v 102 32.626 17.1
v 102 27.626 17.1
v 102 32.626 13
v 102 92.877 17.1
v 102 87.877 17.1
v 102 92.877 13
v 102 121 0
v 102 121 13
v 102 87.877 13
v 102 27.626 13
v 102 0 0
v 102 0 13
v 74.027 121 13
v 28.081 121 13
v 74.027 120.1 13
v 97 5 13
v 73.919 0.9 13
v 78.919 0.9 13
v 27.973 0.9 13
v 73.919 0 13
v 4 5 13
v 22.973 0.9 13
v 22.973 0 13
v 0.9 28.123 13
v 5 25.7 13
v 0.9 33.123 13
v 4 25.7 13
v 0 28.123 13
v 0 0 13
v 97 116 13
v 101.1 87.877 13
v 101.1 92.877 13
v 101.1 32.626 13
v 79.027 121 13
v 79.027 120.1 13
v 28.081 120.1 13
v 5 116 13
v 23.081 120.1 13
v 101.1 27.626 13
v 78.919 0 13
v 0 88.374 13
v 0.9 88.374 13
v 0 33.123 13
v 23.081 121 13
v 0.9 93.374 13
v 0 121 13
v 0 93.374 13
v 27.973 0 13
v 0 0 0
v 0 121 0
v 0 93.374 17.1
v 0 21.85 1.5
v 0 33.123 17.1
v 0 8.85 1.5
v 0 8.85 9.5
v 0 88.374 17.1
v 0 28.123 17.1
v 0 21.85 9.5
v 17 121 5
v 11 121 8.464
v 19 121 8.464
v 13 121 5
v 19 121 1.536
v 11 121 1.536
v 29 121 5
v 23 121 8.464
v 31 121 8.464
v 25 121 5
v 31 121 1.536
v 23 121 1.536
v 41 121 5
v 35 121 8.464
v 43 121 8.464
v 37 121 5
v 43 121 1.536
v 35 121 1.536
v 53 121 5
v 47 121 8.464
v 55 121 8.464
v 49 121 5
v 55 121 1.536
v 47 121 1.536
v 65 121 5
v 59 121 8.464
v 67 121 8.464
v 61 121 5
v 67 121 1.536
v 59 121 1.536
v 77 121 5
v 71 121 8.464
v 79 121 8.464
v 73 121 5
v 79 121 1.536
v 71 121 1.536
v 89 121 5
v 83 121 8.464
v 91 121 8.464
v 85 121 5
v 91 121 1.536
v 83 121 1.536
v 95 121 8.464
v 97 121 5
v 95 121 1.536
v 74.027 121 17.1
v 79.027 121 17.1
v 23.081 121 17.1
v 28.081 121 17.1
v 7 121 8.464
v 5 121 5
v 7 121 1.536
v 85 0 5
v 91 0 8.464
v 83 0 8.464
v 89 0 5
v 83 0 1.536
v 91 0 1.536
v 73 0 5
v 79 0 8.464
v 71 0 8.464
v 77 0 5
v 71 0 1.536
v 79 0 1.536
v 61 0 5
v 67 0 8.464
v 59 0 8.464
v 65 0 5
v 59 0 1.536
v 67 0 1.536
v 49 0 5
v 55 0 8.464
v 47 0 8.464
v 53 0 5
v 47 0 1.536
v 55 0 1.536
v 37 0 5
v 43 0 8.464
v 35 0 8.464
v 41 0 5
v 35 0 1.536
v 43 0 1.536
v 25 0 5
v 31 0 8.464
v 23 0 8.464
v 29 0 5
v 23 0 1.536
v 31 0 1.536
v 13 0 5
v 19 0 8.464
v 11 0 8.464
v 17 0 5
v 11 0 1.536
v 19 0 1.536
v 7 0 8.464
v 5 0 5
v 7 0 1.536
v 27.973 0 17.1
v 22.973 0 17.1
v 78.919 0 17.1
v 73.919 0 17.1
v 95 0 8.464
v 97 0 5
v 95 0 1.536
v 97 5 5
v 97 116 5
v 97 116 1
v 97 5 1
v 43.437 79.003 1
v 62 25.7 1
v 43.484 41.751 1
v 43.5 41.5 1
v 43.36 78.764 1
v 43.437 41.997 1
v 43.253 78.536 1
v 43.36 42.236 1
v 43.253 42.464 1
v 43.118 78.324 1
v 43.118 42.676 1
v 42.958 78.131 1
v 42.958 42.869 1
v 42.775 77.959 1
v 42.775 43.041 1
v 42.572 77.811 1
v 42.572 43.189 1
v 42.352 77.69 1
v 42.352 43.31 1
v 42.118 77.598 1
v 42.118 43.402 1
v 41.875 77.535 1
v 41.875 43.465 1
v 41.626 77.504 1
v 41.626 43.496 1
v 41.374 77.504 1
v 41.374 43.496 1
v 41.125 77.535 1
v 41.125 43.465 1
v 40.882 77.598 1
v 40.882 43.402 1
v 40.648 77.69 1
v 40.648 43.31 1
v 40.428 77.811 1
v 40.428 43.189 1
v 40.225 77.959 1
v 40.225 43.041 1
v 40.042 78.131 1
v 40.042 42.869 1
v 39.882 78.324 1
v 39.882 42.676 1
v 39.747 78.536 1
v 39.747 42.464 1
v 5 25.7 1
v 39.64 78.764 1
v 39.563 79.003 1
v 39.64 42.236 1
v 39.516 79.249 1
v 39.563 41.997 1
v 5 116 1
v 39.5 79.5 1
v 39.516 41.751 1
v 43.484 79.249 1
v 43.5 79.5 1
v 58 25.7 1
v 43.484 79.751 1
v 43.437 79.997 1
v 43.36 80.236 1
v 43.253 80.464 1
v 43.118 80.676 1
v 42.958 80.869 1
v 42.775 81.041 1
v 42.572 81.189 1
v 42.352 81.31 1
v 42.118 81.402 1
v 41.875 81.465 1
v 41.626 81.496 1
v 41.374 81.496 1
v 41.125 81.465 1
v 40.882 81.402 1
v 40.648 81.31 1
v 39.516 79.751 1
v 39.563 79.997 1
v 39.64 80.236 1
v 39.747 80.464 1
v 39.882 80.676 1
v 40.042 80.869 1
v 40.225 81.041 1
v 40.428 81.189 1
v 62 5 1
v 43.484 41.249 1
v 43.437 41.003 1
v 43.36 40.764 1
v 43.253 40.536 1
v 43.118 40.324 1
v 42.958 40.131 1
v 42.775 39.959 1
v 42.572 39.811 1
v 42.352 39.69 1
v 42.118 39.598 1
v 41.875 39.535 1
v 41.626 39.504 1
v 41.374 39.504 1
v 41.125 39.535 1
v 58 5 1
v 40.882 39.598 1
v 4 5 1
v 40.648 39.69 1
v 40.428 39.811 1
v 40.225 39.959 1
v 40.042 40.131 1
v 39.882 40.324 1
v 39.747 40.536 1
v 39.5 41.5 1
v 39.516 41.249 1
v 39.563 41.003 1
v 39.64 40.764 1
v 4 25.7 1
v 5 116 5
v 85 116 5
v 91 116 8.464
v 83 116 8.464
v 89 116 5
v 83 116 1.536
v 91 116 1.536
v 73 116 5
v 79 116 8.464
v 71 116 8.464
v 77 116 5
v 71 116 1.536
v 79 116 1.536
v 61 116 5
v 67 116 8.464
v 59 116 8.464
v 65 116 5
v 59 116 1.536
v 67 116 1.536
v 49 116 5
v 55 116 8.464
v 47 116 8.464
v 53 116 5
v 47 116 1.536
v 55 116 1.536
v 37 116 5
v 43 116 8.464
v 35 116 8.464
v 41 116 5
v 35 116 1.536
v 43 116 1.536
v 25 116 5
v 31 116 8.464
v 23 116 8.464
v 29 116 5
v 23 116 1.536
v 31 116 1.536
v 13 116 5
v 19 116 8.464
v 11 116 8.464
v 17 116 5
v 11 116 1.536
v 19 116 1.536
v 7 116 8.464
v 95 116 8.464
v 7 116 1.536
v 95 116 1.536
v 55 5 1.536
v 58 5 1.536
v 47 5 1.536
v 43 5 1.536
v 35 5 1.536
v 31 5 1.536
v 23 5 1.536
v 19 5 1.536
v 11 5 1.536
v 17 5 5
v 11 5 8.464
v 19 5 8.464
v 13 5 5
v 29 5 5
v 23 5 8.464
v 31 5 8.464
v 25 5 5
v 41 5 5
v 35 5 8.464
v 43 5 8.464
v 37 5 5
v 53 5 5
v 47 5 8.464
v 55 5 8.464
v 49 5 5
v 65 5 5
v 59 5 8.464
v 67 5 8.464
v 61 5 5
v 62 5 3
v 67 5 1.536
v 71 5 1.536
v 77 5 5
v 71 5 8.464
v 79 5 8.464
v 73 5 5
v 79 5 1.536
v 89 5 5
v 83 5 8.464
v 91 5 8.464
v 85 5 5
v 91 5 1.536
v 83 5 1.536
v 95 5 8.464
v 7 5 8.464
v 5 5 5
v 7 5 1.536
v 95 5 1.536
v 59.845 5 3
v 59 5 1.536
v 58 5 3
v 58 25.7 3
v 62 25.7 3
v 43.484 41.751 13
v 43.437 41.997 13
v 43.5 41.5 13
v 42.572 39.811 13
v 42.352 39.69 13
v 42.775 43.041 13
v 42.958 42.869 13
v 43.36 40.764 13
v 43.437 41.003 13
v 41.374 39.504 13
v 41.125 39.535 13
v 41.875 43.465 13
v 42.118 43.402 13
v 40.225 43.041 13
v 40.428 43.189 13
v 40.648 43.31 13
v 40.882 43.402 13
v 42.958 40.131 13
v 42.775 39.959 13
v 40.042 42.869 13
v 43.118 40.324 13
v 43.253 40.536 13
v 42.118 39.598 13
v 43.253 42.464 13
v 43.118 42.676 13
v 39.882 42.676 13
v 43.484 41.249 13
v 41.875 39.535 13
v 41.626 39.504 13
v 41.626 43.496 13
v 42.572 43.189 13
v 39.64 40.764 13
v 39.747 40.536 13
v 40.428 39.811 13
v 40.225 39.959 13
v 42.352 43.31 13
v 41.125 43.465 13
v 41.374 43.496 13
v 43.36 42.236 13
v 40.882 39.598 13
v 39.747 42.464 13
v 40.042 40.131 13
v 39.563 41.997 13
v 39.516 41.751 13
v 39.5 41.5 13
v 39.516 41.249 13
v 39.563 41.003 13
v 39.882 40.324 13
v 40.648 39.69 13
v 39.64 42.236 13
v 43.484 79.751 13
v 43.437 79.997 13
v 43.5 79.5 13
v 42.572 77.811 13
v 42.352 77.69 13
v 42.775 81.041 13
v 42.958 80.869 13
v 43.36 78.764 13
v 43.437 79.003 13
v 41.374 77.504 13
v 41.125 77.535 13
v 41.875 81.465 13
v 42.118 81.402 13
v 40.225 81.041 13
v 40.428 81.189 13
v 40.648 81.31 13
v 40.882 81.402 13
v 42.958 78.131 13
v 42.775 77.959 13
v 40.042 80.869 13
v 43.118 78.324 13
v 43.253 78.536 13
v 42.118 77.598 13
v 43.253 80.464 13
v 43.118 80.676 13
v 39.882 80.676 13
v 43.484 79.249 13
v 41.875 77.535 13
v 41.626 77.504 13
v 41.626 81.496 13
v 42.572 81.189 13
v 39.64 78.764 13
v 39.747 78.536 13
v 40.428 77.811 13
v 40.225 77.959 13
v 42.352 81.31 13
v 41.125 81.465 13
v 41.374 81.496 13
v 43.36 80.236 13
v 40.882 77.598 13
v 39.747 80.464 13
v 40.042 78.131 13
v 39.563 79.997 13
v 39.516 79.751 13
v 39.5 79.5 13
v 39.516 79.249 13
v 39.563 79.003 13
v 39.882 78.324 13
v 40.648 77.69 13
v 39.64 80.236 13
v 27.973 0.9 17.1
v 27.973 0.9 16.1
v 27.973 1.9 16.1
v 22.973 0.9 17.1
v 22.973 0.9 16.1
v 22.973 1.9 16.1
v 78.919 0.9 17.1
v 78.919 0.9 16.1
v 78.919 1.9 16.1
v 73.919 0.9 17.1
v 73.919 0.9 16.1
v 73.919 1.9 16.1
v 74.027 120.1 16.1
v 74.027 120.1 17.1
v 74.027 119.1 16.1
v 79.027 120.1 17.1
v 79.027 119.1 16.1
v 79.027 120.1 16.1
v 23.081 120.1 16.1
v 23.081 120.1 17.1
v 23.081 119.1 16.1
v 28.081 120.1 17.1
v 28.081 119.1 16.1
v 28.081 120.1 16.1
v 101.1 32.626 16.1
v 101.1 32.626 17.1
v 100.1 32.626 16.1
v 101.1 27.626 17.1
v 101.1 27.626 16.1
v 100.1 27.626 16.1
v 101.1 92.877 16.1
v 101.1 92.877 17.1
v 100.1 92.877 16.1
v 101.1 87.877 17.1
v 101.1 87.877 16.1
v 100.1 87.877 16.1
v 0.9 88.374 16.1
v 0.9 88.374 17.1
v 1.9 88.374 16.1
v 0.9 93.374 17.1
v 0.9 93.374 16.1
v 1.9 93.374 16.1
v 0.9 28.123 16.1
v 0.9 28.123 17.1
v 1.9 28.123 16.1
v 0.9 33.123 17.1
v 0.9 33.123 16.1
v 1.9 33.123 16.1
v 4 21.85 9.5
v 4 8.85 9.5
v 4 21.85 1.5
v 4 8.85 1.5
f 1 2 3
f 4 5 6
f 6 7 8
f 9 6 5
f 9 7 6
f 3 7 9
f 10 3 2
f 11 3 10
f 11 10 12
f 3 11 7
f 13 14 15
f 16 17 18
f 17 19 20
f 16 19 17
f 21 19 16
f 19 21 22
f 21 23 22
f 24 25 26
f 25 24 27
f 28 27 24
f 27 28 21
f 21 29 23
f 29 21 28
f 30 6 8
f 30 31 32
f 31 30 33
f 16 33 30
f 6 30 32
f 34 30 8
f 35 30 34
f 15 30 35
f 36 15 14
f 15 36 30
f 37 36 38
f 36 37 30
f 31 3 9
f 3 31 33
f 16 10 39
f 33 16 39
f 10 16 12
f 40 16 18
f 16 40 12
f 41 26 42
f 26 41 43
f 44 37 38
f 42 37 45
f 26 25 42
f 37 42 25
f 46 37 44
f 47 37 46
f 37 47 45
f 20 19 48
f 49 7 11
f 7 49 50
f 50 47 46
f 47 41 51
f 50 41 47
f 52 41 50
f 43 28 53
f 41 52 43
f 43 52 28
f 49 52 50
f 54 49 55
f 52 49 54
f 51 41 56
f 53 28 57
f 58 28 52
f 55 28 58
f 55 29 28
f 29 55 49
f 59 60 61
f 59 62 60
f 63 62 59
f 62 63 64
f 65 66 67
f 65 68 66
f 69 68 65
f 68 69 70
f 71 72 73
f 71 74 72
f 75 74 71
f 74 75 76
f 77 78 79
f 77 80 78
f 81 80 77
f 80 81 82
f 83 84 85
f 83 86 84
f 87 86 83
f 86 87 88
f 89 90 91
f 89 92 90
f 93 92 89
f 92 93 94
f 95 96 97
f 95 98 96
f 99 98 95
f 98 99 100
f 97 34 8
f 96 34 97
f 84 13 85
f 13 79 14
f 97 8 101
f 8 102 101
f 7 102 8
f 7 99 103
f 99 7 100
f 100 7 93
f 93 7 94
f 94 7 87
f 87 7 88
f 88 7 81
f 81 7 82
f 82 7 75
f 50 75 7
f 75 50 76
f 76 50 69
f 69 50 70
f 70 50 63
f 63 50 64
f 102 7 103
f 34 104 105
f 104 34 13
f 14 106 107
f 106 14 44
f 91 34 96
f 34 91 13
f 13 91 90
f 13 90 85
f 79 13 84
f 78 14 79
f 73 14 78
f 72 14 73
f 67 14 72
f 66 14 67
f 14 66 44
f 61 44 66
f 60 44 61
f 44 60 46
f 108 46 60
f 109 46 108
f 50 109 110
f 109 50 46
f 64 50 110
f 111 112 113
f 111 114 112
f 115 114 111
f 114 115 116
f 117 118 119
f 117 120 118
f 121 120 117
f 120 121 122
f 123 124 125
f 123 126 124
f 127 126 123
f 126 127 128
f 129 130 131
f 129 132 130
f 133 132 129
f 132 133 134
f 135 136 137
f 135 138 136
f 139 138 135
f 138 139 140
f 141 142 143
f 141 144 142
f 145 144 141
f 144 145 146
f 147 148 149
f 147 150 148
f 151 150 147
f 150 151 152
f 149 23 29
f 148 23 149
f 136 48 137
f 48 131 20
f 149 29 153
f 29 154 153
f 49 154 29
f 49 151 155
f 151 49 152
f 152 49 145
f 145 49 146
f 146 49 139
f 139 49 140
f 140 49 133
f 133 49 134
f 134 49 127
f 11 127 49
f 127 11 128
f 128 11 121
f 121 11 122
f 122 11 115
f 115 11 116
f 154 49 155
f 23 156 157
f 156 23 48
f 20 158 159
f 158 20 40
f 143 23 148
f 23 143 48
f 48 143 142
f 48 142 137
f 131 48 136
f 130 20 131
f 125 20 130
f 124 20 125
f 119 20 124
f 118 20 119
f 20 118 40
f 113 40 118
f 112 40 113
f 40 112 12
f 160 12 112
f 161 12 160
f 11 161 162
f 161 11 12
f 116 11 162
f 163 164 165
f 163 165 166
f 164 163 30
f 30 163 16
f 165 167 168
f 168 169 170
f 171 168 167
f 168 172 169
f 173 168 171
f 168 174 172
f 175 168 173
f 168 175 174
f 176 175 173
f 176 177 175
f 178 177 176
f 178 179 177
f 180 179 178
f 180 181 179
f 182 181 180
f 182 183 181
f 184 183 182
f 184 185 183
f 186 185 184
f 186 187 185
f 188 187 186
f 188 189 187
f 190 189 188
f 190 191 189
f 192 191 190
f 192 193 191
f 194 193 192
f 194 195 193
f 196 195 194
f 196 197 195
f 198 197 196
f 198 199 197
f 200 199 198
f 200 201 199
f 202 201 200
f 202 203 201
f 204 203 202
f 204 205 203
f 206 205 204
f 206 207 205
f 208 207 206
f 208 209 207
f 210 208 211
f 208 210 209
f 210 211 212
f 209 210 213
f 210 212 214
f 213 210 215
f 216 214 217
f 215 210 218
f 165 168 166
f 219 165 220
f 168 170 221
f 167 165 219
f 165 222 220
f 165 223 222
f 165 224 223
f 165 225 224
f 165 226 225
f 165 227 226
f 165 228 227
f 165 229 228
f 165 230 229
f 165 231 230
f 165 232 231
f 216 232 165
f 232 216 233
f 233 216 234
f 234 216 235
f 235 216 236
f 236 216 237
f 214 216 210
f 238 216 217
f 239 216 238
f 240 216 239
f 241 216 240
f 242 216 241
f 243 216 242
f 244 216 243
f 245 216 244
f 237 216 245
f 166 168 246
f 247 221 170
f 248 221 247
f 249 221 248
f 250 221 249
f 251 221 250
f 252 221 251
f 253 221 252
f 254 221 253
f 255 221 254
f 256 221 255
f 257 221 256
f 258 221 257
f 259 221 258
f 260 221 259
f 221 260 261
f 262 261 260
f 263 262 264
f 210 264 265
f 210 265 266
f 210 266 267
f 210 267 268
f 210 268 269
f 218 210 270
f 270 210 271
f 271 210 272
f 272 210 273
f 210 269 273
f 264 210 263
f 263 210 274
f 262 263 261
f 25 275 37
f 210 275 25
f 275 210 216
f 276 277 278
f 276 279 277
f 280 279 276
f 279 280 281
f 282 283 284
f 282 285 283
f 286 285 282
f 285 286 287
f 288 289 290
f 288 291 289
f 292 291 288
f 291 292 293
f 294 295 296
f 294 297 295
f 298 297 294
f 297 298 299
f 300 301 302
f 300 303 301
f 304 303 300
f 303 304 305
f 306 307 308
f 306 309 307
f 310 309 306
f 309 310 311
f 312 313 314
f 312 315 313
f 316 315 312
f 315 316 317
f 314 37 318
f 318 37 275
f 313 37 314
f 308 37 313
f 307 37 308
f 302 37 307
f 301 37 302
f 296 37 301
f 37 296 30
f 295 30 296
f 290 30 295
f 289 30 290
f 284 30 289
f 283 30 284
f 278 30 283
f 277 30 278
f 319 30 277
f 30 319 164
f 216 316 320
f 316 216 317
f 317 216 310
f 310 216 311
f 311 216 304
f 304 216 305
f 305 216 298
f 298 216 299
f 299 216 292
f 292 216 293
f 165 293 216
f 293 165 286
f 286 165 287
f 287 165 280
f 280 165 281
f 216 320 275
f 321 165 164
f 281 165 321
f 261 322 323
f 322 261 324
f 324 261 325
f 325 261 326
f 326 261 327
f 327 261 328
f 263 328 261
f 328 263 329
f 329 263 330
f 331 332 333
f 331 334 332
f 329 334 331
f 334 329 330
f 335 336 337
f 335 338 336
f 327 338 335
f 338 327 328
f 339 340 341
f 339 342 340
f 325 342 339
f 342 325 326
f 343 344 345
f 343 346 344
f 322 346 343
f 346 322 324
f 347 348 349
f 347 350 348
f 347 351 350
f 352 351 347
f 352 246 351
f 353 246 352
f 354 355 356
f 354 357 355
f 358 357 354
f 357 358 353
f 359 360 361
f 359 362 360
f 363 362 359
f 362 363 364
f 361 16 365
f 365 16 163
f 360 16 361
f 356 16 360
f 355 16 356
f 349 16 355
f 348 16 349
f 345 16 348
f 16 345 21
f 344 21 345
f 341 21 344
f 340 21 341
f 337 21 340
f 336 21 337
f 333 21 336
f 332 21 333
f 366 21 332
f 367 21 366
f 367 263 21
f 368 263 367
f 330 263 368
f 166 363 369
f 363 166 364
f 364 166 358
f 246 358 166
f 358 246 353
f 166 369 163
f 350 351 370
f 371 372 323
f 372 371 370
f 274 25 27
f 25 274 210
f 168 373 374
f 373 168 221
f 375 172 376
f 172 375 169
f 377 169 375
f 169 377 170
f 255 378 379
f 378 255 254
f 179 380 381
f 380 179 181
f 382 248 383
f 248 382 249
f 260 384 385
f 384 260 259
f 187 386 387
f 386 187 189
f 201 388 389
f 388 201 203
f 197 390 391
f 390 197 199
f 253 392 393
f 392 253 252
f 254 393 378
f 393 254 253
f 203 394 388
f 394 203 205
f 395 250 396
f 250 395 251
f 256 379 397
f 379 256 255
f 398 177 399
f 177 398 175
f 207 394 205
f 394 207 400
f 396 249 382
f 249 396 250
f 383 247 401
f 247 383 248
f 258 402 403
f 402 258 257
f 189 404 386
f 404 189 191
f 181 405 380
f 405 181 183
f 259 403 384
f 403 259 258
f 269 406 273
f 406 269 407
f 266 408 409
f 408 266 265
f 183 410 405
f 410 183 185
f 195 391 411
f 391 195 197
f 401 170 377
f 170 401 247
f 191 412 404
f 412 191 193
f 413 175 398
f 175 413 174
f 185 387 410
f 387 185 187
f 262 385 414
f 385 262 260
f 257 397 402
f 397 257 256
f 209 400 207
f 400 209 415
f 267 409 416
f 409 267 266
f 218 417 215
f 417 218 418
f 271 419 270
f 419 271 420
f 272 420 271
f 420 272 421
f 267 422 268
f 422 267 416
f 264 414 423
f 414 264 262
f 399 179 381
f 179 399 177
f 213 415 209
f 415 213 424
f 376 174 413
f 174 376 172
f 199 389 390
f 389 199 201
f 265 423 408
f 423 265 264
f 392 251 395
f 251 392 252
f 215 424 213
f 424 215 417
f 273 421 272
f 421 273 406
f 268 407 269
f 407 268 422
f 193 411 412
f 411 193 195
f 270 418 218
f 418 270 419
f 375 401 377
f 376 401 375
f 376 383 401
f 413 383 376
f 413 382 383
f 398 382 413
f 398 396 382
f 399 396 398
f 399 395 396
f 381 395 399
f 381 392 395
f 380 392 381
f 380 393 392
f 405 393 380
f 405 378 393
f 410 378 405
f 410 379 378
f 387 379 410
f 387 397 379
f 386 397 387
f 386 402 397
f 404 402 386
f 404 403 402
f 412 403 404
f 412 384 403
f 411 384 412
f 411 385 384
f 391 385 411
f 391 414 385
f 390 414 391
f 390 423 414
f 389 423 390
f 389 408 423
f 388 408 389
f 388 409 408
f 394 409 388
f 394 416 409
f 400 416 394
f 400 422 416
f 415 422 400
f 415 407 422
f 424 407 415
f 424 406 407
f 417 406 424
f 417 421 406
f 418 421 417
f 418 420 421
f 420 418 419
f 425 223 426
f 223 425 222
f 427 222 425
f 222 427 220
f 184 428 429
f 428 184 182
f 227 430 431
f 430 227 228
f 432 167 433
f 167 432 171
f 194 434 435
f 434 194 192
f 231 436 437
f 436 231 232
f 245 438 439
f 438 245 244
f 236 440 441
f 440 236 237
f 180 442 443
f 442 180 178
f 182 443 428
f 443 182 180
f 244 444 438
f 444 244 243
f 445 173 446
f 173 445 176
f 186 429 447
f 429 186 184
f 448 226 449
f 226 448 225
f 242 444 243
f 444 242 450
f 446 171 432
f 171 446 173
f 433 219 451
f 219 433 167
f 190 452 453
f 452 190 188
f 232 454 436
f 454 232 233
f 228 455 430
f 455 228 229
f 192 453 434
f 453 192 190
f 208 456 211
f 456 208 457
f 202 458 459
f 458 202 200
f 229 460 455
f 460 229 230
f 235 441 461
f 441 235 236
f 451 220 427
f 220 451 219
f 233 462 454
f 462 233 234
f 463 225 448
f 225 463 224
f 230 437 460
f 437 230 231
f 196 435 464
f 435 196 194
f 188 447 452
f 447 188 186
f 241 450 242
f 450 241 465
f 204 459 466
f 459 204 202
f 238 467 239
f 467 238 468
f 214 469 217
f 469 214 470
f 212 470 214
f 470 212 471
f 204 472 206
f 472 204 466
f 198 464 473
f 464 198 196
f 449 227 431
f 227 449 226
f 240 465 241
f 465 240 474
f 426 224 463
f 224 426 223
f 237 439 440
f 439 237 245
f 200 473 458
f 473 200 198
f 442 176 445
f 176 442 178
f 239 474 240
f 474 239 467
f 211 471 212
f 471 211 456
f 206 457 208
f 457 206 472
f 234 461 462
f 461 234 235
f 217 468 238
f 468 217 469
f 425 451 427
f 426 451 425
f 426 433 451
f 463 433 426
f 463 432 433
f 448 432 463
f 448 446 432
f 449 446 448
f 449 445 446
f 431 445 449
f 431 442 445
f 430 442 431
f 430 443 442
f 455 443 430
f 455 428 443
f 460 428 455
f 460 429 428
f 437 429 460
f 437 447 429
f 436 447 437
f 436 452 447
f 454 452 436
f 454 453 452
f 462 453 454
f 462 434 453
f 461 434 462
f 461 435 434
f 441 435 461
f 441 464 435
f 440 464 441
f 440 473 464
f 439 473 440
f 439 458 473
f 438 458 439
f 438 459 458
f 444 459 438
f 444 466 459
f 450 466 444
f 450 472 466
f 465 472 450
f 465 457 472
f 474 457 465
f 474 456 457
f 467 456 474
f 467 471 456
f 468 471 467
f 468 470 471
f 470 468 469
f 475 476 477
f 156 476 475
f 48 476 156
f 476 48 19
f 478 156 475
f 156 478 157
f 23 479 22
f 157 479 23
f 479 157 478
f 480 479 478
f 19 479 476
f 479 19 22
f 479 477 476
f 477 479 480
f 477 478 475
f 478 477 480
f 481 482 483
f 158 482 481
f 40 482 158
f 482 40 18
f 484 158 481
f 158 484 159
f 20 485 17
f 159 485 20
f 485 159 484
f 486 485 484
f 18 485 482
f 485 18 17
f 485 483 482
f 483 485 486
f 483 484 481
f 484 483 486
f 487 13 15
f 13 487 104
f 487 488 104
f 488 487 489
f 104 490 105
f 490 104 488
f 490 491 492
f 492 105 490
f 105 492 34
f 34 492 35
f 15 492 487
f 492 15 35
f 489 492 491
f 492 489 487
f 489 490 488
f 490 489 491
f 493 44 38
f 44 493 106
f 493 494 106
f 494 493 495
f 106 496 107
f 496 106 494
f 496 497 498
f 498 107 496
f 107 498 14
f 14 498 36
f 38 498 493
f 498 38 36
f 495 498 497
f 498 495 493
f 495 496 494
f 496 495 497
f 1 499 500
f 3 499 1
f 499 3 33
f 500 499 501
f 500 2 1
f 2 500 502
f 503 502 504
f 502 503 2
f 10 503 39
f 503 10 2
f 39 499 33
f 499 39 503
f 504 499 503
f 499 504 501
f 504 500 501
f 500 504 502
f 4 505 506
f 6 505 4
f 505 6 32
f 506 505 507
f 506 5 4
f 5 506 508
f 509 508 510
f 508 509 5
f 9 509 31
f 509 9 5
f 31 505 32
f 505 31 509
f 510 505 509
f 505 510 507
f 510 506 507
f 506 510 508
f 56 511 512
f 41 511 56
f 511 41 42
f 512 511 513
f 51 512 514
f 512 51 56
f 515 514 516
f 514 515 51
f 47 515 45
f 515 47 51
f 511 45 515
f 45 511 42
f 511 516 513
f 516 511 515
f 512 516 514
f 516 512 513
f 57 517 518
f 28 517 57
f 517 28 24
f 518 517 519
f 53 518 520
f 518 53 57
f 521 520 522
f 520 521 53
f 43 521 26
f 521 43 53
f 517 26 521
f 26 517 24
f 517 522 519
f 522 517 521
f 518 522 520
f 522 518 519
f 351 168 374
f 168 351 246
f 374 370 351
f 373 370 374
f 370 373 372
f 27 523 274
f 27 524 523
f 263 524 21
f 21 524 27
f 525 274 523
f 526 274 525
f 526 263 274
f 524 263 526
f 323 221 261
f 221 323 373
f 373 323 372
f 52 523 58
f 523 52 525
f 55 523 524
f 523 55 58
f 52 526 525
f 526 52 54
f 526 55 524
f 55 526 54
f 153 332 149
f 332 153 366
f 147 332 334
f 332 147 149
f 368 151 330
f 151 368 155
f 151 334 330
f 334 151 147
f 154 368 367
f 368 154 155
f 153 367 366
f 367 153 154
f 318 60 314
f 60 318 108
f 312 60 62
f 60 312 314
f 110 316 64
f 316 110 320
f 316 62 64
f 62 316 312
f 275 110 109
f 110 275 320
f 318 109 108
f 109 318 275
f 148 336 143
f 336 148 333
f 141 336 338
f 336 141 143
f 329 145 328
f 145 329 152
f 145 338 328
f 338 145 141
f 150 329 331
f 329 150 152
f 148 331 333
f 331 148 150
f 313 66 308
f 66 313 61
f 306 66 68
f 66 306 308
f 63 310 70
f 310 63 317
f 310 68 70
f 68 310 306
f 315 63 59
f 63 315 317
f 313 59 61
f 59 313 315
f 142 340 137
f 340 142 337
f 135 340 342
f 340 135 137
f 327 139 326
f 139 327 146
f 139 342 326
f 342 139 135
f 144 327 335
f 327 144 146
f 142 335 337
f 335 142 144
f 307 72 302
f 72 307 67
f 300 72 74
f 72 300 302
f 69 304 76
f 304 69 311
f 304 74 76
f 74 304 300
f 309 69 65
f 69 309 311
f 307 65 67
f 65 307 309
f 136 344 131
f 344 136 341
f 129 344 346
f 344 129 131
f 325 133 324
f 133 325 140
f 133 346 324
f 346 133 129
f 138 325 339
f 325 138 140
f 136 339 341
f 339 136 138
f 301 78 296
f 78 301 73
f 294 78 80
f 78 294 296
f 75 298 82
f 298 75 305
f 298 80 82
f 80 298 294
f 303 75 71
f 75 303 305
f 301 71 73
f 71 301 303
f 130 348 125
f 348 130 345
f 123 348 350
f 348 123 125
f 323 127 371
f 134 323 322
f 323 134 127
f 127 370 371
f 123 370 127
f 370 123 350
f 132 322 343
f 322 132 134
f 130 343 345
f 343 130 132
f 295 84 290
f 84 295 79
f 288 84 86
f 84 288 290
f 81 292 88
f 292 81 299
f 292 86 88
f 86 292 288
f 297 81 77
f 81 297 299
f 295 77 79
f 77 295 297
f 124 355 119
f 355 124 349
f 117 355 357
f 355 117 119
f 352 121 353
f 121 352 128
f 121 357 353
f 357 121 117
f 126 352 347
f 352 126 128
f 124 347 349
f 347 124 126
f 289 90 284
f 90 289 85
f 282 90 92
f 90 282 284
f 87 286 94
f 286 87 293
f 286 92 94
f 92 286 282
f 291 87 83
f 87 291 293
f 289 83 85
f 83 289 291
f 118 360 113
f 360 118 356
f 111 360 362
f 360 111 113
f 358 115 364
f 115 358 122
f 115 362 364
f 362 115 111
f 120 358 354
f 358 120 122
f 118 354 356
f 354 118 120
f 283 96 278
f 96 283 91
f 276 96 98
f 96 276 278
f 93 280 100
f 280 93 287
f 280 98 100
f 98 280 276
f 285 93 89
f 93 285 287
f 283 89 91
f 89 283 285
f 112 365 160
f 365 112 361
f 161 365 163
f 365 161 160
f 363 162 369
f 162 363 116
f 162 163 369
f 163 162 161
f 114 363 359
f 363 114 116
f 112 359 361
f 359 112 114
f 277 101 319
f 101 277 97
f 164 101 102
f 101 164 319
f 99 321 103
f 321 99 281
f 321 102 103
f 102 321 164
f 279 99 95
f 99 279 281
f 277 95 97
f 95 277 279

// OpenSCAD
// file: stm32.scad
STM32Size = [20.7, 54, 5];

module STM32Cube() {
    cube([STM32Size.x, STM32Size.y, STM32Size.z]);
}
module STM32() {
    cube([STM32Size.x, STM32Size.y, 2]);
    translate([5.85, 0, 2]) cube([9, 7.5, 3]);
}
// file: Plate.scad
module SwitchHoles(x, y, wallWidth, switchSize, separation, padding = 0) {
    for (i = [0:x-1]) {
        for (j = [0:y-1]) {
            translate([(5-padding/2)+(switchSize+separation)*i, (5-padding/2)+(switchSize+separation)*j, 0])
                cube([switchSize+padding, switchSize+padding, 2]);
        }
    }
}

module Plate(x, y, wallWidth, switchSize, switchSeparation) {
    width = wallWidth+(switchSize+switchSeparation)*x;
    length = wallWidth+(switchSize+switchSeparation)*y;
    difference() {
        cube([width, length, 1.5]);
        SwitchHoles(x, y, wallWidth, switchSize, switchSeparation);
    }
    translate([0,0,1.5])
    difference() {
        cube([width, length, 1.5]);
        SwitchHoles(x, y, wallWidth, switchSize, switchSeparation, 1.6);
    }
}

//Plate(5, 6, 5, 14, 5);
// file: Base.scad
include <Plate.scad>
include <stm32.scad>

module Supports(x, y, wallWidth, separation, size, height, angle, padding) {
    for (i = [0:x/2]) {
        for (j = [0:y-1]) {
            if (i && j && i % 2 == 0 && j % 2 == 0) {
                translate([wallWidth+padding+(size+separation)*i-2.5, wallWidth+padding+(size+separation)*j-2.5, 0])
                rotate([0, angle, 0])
                    cylinder(h=height, d=4, $fn=50);
            }
        }
    }
}

module Hole(wallSize, holeSize) {
    rotate([-90, 0, 0])
        cylinder(h=wallSize, d=holeSize, $fn=6);
}

module Holes(baseWidth, wallSize, width, length, holeSize) {
    holeSeparation = holeSize/2;
    holesCount = floor((width-(wallSize*2)+holeSeparation)/(holeSize+holeSeparation));
    echo(holesCount);
    holesWidth = (holesCount*holeSize)+((holesCount-1)*holeSeparation);
    holesOffset = wallSize+holeSize/2;
    for (i = [0:holesCount-1]) {
        translate([holesOffset+((holeSize+holeSeparation)*i), 0, (holeSize/2)+baseWidth])
            Hole(wallSize, holeSize);

        translate([holesOffset+((holeSize+holeSeparation)*i), length-wallSize, (holeSize/2)+baseWidth])
            Hole(wallSize, holeSize);
    }
}

module BaseWithCutout(width, length, height, separation, baseWidth, wallWidth, stm32Offset, usbOutOrientation, angle) {
    difference() {
        slopeHeight = (tan(angle)*width);
        union() {
            cube([width, length, height]);

            translate([0, 0, height]) {
                polyhedron(
                points = [[0, 0, 0], [0, length, 0], [width, length, 0], [width, 0, 0], [0, 0, slopeHeight], [0, length, slopeHeight]],
                faces = [[0, 1, 2, 3], [5, 4, 3, 2], [0, 4, 5, 1], [0, 3, 4], [5, 2, 1]]
                );
            }
        }

        translate([wallWidth, wallWidth, baseWidth])
        cube([width-(wallWidth*2), length-(wallWidth*2), height-baseWidth+slopeHeight]);

        // STM32 cutout
        if (usbOutOrientation == 2) {
            translate([0, wallWidth, baseWidth])
                cube([wallWidth, STM32Size.x, STM32Size.z + stm32Offset + 3]);
        } else {
            translate([0, wallWidth, baseWidth])
                cube([wallWidth, STM32Size.y, STM32Size.z + stm32Offset + 3]);
        }
    }
}

module STM32CaseBase(stm32Offset, wallWidth, baseWidth) {
    ceilingWidth = 3;
    cube([STM32Size.x+wallWidth, STM32Size.y+(wallWidth*2), STM32Size.z+stm32Offset+ceilingWidth+baseWidth]);
}

module STM32Case(stm32Offset, caseWallWidth, baseWidth, wallWidth, usbOutOrientation) {
    difference() {
        STM32CaseBase(stm32Offset, caseWallWidth, baseWidth);

        if (usbOutOrientation == 2) {
            translate([0, 0, baseWidth+2])
            cube([STM32Size.x+caseWallWidth, STM32Size.y+(caseWallWidth*1), STM32Size.z+stm32Offset+3+baseWidth]);
        }

        // Inside cutout
        translate([caseWallWidth, caseWallWidth, baseWidth])
            cube([STM32Size.x+wallWidth, STM32Size.y, STM32Size.z+stm32Offset]);

        // USB plug
        usbWidth = 13;
        usbHeight = 5;
        translate([caseWallWidth+STM32Size.x/2-usbWidth/2, usbOutOrientation == 1 || usbOutOrientation == 2 ? STM32Size.y+caseWallWidth : 0, baseWidth+0.5])
            cube([usbWidth, usbHeight, 8]);
    }
}

module Clip() {
    cube([5, 0.9, 4.1]);
    l=5;
    w=1;
    h=1;
    translate([0, 0.9, 3.1]) {
        polyhedron(
            points = [[0, 0, 0], [l, 0, 0], [l, w, 0], [0, w, 0], [0, 0, h], [l, 0, h]],
            faces = [[0, 1, 2, 3], [5, 4, 3, 2], [0, 4, 5, 1], [0, 3, 4], [5, 2, 1]]
        );
    }
}

module Base(x, y, heightOffset, baseWidth, wallWidth, size, separation, angle, holeSize, usbOutOrientation, withPlate = false) {
    assert(separation >= 5, "Separation of switches cannot be less than 5 otherwise keycaps won't go in");
    padding = 1;
    width = (wallWidth + (size+separation)*x) + padding*2;
    length = (wallWidth + (size+separation)*y)  + padding*2;
    holesSize = 7;
    height = holesSize+baseWidth+heightOffset; //(tan(angle)*width)
    stm32CaseWallSize = 4;
    stm32Offset = 4;

    difference() {
        union() {
            BaseWithCutout(width, length, height, separation, baseWidth, wallWidth, stm32Offset, usbOutOrientation, angle);
            Supports(x, y, wallWidth, separation, size, height, angle, padding);

            translate([0, 0, height]) {
                clipSeparationX = width/2.22;
                clipSeparationY = length/2.19;
                clipWidth = 5;
                for (i = [0:width/(clipWidth+clipSeparationX)-1]) {
                    translate([clipSeparationX/2+((clipWidth+clipSeparationX)*i), 0, 0]) Clip();
                }
                rotate([0, 0, -180]) {
                    for (i = [0:width/(clipWidth+clipSeparationX)-1]) {
                        translate([(clipSeparationX/2+((clipWidth+clipSeparationX)*i))-width, -length, 0]) Clip();
                    }
                }
                rotate([0, 0, 90]) {
                    for (i = [0:length/(clipWidth+clipSeparationY)-1]) {
                        translate([clipSeparationY/2+((clipWidth+clipSeparationY)*i), -width, 0]) Clip();
                    }
                }
                rotate([0, 0, -90]) {
                    for (i = [0:length/(clipWidth+clipSeparationY)-1]) {
                        translate([(clipSeparationY/2+((clipWidth+clipSeparationY)*i))-length, 0, 0]) Clip();
                    }
                }
            }


            if (usbOutOrientation == 2) {
                translate([STM32Size.y+(stm32CaseWallSize*2), wallWidth-stm32CaseWallSize, 0])
                rotate([0, 0, 90])
                    STM32Case(stm32Offset, stm32CaseWallSize, baseWidth, wallWidth, usbOutOrientation);
            } else {
                translate([-(STM32Size.x + stm32CaseWallSize), wallWidth - stm32CaseWallSize, 0])
                    STM32Case(stm32Offset, stm32CaseWallSize, baseWidth, wallWidth, usbOutOrientation);
            }
        }
        Holes(baseWidth, wallWidth, width, length, holeSize);

        // Clear underside
        translate([0, 0, -1])
            cube([width, length, 1]);
    }

    if (withPlate) {
        translate([0, 0, height])
            rotate([0, 0, 180])
                translate([-width+padding, -length+padding, 0])
                    rotate([0, - angle, 0])
                        Plate(rows, cols, wallWidth, switchSize, switchSeparation);
    }
}
// main file
include <Base.scad>

rows = 5;
cols = 6;
baseWidth = 1;
wallWidth = 5;
switchSize = 14;
switchSeparation = 5;
angle = 0;
height = 5;
holeSize = 8;
usbOutOrientation = 2; // 0 = left, 1 = right, 2 = top

Base(rows, cols, height, baseWidth, wallWidth, switchSize, switchSeparation, angle, holeSize, usbOutOrientation, false);
